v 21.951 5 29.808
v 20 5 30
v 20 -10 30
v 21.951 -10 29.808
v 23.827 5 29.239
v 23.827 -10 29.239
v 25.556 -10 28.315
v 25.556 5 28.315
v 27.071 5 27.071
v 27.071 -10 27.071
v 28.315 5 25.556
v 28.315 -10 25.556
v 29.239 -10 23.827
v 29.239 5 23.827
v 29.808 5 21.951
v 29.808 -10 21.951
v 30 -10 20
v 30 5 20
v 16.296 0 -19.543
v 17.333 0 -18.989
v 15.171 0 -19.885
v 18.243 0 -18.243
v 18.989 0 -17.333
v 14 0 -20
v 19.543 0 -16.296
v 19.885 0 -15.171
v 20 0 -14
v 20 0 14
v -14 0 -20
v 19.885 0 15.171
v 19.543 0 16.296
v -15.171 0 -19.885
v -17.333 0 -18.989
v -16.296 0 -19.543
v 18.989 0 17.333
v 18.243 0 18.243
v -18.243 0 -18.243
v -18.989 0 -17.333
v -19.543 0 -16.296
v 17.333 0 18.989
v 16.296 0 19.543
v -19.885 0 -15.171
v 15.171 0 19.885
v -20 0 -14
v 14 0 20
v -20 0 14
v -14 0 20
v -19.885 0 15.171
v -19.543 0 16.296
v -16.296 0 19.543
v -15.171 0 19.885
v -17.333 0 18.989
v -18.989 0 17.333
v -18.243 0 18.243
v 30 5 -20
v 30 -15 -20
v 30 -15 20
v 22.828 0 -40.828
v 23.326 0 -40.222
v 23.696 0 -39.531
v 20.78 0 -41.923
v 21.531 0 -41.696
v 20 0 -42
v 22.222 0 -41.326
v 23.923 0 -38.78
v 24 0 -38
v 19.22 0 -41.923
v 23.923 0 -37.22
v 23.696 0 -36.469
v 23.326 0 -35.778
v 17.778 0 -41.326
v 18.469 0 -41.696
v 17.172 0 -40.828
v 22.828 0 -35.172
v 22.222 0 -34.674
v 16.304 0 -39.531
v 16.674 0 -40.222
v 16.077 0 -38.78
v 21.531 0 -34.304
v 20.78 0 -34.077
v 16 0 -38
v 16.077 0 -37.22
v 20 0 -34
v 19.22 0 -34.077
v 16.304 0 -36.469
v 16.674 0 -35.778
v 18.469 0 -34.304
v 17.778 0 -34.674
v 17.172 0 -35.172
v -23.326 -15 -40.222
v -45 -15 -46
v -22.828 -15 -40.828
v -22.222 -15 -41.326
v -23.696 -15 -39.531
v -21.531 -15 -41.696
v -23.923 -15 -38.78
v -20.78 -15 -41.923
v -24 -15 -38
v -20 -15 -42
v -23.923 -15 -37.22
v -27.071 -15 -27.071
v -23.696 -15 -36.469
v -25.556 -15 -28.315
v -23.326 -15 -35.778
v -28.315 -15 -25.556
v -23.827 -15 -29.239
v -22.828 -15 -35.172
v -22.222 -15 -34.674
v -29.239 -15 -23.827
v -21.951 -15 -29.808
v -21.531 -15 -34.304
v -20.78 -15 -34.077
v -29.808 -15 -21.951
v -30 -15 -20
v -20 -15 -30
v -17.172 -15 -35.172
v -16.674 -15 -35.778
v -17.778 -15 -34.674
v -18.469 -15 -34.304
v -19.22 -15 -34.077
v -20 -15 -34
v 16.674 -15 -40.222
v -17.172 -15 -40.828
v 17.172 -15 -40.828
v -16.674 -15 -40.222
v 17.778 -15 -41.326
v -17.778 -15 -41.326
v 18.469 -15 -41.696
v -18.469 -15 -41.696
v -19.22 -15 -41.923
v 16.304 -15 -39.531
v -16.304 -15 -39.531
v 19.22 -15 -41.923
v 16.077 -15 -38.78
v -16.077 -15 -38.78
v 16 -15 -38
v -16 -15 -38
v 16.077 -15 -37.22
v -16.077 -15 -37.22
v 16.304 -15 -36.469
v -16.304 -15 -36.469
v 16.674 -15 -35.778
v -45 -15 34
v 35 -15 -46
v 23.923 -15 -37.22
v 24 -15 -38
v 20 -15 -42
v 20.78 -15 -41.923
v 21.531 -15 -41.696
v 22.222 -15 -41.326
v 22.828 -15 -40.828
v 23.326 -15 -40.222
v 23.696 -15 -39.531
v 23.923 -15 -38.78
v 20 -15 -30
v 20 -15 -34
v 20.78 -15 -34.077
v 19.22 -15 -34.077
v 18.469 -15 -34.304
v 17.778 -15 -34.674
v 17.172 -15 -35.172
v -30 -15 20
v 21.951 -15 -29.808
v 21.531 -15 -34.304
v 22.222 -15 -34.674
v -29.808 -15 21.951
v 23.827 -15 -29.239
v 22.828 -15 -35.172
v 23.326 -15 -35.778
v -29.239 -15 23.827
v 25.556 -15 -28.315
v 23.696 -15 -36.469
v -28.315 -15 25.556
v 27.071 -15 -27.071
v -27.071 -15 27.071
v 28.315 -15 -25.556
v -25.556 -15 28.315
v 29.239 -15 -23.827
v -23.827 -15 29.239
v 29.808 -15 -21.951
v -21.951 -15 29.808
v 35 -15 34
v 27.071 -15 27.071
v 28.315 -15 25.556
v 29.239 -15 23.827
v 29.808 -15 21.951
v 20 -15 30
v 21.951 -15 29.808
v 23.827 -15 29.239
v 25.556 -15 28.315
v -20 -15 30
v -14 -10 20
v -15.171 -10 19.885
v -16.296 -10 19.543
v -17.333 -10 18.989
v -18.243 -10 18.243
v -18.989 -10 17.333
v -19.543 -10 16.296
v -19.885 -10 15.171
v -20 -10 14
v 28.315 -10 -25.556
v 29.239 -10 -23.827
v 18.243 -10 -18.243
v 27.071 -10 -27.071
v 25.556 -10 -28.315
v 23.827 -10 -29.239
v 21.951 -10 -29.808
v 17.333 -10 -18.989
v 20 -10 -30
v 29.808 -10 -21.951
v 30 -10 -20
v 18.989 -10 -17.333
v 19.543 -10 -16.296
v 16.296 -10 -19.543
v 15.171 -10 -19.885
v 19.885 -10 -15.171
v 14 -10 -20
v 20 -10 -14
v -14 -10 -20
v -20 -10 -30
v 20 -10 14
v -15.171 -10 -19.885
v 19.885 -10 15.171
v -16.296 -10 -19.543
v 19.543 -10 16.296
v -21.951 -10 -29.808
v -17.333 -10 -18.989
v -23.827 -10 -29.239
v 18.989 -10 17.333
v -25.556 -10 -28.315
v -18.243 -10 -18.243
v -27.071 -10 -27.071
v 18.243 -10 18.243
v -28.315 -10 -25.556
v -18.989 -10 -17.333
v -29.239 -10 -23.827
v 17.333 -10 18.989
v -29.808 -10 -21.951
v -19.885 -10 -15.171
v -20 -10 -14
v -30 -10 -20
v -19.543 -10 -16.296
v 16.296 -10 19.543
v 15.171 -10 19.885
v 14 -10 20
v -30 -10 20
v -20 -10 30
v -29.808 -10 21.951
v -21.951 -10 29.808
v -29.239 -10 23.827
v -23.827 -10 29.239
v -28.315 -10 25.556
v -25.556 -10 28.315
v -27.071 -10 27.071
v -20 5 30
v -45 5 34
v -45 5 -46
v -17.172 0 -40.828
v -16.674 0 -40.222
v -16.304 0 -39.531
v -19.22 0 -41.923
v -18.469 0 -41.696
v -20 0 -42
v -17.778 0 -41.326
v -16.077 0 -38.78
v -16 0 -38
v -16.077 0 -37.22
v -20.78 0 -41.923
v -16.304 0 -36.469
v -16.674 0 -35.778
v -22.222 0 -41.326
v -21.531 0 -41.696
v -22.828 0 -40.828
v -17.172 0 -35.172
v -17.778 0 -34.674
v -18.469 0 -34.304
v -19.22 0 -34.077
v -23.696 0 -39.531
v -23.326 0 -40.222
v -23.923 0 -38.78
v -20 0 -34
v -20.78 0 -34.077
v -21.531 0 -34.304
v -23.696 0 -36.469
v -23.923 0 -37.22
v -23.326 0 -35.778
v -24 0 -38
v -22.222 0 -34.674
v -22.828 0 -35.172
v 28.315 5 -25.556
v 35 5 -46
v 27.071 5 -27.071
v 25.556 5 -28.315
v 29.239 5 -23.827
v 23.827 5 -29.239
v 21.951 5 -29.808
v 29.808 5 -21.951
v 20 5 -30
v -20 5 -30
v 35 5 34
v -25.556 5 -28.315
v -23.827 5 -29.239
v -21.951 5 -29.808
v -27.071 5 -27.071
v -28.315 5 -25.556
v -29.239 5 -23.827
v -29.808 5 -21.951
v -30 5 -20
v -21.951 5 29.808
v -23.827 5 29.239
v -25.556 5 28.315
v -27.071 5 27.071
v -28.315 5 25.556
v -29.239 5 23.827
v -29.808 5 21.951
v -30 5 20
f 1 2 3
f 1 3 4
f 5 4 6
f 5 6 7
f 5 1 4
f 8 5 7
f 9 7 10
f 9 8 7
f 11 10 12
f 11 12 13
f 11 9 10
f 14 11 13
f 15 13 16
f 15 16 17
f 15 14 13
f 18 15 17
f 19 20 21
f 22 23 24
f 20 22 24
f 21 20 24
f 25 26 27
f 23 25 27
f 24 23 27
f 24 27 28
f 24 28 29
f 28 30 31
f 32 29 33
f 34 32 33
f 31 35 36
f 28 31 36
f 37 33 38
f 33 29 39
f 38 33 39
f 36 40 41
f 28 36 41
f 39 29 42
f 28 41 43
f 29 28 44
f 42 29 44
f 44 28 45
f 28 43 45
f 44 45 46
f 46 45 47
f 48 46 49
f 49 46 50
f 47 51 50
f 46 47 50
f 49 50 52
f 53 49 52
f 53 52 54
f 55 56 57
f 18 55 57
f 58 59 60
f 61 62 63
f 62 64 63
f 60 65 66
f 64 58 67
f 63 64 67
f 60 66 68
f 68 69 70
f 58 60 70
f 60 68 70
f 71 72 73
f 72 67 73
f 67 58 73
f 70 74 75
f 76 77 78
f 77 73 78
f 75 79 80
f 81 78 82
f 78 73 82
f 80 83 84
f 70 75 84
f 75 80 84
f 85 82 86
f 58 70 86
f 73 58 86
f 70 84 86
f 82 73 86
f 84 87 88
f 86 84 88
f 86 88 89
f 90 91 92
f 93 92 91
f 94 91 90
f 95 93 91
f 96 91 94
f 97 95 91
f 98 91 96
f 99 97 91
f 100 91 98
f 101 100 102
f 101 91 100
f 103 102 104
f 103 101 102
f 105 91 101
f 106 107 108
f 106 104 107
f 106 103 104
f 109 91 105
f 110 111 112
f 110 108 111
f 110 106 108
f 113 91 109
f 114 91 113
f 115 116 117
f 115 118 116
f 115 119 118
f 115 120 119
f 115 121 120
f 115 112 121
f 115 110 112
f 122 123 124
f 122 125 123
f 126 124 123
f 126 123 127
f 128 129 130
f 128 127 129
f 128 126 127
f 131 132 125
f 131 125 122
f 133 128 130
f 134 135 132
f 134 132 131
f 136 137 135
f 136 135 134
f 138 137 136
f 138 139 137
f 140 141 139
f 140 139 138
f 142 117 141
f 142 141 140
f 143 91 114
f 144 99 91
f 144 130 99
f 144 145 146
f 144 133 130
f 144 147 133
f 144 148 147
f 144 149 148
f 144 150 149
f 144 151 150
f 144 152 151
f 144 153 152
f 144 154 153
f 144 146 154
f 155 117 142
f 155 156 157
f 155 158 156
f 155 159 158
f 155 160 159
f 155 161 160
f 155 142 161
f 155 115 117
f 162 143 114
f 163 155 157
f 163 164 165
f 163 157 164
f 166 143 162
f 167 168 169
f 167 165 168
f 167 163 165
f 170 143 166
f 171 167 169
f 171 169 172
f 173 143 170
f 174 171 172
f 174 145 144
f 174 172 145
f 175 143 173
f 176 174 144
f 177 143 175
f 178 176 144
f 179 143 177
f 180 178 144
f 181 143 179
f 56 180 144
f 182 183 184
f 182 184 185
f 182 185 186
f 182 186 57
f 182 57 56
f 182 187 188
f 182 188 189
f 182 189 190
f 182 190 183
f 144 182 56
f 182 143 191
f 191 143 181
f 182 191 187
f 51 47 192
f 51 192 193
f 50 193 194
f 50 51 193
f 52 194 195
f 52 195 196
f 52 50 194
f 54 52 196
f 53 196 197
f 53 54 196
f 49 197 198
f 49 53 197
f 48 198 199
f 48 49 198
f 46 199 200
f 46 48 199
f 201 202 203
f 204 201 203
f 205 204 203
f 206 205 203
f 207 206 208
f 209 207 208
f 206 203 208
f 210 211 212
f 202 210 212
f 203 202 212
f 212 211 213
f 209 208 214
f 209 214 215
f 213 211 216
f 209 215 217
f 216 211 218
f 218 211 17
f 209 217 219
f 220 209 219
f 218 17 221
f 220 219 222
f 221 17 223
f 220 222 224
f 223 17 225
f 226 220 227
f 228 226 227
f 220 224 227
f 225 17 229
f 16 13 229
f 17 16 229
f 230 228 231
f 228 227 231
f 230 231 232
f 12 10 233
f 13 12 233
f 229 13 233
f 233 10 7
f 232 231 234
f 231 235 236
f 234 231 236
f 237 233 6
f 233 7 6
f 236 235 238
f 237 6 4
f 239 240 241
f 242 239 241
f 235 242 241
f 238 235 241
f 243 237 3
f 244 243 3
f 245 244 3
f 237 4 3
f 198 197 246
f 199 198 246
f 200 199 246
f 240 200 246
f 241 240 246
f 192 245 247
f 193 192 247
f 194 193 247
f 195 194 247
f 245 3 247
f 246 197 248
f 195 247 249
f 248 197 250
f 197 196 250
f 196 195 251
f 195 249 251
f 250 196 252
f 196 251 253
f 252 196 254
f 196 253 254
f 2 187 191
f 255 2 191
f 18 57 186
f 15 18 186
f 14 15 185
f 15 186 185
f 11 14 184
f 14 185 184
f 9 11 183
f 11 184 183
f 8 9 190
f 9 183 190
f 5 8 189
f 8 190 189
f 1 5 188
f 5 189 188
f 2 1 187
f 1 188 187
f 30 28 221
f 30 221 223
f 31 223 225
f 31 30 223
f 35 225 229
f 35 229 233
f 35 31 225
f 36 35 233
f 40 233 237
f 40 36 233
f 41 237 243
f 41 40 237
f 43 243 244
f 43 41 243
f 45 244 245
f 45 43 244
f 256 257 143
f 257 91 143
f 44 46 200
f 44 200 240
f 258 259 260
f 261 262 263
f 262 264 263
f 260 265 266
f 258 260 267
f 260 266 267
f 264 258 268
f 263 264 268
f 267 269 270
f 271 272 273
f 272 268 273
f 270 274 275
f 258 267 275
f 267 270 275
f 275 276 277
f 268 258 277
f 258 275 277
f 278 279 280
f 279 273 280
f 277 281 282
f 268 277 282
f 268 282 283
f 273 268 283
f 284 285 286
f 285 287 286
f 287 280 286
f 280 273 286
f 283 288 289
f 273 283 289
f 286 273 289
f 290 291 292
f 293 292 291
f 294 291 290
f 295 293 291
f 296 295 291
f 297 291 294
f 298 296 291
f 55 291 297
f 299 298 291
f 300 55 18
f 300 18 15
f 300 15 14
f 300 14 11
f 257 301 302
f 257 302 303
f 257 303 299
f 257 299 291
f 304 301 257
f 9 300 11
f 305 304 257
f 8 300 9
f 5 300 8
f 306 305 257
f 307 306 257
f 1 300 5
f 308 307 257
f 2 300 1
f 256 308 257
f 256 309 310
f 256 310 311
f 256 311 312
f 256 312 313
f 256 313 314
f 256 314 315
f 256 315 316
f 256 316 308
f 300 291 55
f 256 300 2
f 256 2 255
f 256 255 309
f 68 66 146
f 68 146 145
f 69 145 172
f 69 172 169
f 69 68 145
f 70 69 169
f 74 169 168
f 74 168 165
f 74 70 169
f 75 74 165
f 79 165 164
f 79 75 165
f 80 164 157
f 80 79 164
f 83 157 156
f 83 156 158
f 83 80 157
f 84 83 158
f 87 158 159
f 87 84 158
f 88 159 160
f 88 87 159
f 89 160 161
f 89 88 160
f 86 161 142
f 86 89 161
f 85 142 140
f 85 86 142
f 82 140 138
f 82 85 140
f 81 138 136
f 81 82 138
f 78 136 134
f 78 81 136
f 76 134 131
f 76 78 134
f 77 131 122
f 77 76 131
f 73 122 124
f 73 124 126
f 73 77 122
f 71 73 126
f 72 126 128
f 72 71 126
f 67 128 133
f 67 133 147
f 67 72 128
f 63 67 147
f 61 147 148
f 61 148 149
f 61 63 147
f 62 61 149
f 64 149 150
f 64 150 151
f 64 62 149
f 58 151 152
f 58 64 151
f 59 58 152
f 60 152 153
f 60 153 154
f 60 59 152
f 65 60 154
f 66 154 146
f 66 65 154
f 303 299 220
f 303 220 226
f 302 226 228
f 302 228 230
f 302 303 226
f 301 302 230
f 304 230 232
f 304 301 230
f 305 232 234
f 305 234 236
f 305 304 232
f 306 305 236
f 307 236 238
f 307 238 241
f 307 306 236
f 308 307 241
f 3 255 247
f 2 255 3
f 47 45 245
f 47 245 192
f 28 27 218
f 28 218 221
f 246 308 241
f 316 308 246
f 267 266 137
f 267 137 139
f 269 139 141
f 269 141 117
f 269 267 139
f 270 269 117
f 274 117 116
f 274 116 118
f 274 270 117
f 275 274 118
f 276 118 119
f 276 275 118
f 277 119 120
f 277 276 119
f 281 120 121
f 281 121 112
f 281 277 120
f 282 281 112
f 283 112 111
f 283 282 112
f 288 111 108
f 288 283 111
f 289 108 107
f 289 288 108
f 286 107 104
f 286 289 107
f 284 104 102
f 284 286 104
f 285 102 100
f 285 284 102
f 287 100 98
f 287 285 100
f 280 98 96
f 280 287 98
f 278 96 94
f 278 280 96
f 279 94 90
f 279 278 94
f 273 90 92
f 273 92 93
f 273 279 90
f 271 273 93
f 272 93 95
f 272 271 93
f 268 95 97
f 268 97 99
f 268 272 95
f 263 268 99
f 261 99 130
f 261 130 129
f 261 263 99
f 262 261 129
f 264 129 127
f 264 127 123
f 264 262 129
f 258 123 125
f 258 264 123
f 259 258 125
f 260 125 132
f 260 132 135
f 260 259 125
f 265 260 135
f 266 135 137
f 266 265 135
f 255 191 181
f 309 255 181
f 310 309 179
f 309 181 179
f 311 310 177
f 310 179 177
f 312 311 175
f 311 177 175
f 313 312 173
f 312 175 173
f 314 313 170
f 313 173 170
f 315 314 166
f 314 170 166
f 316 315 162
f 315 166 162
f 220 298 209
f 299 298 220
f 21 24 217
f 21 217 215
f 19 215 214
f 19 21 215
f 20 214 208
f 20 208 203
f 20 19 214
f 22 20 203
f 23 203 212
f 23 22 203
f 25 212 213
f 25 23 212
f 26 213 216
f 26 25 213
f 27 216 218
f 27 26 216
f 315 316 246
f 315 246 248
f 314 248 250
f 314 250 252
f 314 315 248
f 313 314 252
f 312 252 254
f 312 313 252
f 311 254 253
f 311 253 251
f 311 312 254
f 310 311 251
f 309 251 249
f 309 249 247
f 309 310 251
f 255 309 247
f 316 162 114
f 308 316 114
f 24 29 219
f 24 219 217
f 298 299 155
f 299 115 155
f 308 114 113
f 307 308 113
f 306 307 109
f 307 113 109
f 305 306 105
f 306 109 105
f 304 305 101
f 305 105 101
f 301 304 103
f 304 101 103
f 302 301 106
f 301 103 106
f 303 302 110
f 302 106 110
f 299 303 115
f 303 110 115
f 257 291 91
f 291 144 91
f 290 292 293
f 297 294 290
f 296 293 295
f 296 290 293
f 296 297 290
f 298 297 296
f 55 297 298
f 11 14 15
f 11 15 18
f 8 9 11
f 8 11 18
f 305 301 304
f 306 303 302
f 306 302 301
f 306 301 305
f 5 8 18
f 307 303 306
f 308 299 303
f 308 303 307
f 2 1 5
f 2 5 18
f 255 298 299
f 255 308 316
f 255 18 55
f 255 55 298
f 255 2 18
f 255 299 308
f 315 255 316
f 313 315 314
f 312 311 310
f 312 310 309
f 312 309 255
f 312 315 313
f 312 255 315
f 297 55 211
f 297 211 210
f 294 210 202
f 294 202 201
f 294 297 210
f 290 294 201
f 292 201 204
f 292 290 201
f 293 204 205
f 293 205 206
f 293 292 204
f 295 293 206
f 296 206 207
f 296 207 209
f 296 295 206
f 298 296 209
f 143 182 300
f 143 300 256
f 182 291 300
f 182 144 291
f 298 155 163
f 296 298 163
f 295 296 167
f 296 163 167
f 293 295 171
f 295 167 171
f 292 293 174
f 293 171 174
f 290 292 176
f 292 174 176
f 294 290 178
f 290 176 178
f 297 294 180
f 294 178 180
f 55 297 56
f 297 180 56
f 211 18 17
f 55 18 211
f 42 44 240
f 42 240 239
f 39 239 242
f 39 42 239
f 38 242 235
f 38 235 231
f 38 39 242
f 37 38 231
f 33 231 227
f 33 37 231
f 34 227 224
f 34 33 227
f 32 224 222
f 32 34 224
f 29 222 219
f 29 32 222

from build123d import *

# Parameters (mm, degrees)
F0_W     = 80
F0_H     = 80
F0_R     = 4
F1_DEPTH = 15
F2_W     = 80
F2_H     = 80
F3_DEPTH = 5
F5_DEPTH = 15
F7_DEPTH = 5


with BuildPart() as f1:
    # F0 (on Front) → F1 (new body)
    with BuildSketch(Plane.XZ):
        with Locations((-5, -6)):
            Rectangle(F0_W, F0_H)
        with Locations((-20, -38)):
            Circle(F0_R, mode=Mode.SUBTRACT)
        with Locations((20, -38)):
            Circle(F0_R, mode=Mode.SUBTRACT)
        with BuildLine():
            ThreePointArc((30, -20), (27.071068, -27.071068), (20, -30))
            Line((20, -30), (-20, -30))
            ThreePointArc((-20, -30), (-27.071068, -27.071068), (-30, -20))
            Line((-30, -20), (-30, 20))
            ThreePointArc((-30, 20), (-27.071068, 27.071068), (-20, 30))
            Line((-20, 30), (20, 30))
            ThreePointArc((20, 30), (27.071068, 27.071068), (30, 20))
            Line((30, 20), (30, -20))
        make_face(mode=Mode.SUBTRACT)
    extrude(amount=F1_DEPTH)

    # F2 (on face) → F3 (join)
    with BuildSketch(Plane(origin=(0, 0, 0), x_dir=(-1, 0, 0), z_dir=(0, 1, 0))):
        with Locations((5, -6)):
            Rectangle(F2_W, F2_H)
        with BuildLine():
            Line((20, -30), (-20, -30))
            ThreePointArc((-20, -30), (-27.071068, -27.071068), (-30, -20))
            Line((-30, -20), (-30, 20))
            ThreePointArc((-30, 20), (-27.071068, 27.071068), (-20, 30))
            Line((-20, 30), (20, 30))
            ThreePointArc((20, 30), (27.071068, 27.071068), (30, 20))
            Line((30, 20), (30, -20))
            ThreePointArc((30, -20), (27.071068, -27.071068), (20, -30))
        make_face(mode=Mode.SUBTRACT)
    extrude(amount=F3_DEPTH)


with BuildPart() as f5:
    # F4 (on face) → F5 (new body)
    with BuildSketch(Plane(origin=(0, 5, 0), x_dir=(-1, 0, 0), z_dir=(0, 1, 0))):
        with BuildLine():
            ThreePointArc((-30, -20), (-27.071068, -27.071068), (-20, -30))
            Line((-20, -30), (20, -30))
            ThreePointArc((20, -30), (27.071068, -27.071068), (30, -20))
            Line((30, -20), (30, 20))
            ThreePointArc((30, 20), (27.071068, 27.071068), (20, 30))
            Line((20, 30), (-20, 30))
            ThreePointArc((-20, 30), (-27.071068, 27.071068), (-30, 20))
            Line((-30, 20), (-30, -20))
        make_face()
        with BuildLine():
            Line((14, -20), (-14, -20))
            ThreePointArc((-14, -20), (-18.242641, -18.242641), (-20, -14))
            Line((-20, -14), (-20, 14))
            ThreePointArc((-20, 14), (-18.242641, 18.242641), (-14, 20))
            Line((-14, 20), (14, 20))
            ThreePointArc((14, 20), (18.242641, 18.242641), (20, 14))
            Line((20, 14), (20, -14))
            ThreePointArc((20, -14), (18.242641, -18.242641), (14, -20))
        make_face(mode=Mode.SUBTRACT)
    extrude(amount=-F5_DEPTH)

    # F6 (on face) → F7 (join)
    with BuildSketch(Plane(origin=(0, 5, 0), x_dir=(-1, 0, 0), z_dir=(0, 1, 0))):
        with BuildLine():
            ThreePointArc((-20, -14), (-18.242641, -18.242641), (-14, -20))
            Line((-14, -20), (14, -20))
            ThreePointArc((14, -20), (18.242641, -18.242641), (20, -14))
            Line((20, -14), (20, 14))
            ThreePointArc((20, 14), (18.242641, 18.242641), (14, 20))
            Line((14, 20), (-14, 20))
            ThreePointArc((-14, 20), (-18.242641, 18.242641), (-20, 14))
            Line((-20, 14), (-20, -14))
        make_face()
    extrude(amount=-F7_DEPTH)


solid = Compound([f1.part, f5.part])
